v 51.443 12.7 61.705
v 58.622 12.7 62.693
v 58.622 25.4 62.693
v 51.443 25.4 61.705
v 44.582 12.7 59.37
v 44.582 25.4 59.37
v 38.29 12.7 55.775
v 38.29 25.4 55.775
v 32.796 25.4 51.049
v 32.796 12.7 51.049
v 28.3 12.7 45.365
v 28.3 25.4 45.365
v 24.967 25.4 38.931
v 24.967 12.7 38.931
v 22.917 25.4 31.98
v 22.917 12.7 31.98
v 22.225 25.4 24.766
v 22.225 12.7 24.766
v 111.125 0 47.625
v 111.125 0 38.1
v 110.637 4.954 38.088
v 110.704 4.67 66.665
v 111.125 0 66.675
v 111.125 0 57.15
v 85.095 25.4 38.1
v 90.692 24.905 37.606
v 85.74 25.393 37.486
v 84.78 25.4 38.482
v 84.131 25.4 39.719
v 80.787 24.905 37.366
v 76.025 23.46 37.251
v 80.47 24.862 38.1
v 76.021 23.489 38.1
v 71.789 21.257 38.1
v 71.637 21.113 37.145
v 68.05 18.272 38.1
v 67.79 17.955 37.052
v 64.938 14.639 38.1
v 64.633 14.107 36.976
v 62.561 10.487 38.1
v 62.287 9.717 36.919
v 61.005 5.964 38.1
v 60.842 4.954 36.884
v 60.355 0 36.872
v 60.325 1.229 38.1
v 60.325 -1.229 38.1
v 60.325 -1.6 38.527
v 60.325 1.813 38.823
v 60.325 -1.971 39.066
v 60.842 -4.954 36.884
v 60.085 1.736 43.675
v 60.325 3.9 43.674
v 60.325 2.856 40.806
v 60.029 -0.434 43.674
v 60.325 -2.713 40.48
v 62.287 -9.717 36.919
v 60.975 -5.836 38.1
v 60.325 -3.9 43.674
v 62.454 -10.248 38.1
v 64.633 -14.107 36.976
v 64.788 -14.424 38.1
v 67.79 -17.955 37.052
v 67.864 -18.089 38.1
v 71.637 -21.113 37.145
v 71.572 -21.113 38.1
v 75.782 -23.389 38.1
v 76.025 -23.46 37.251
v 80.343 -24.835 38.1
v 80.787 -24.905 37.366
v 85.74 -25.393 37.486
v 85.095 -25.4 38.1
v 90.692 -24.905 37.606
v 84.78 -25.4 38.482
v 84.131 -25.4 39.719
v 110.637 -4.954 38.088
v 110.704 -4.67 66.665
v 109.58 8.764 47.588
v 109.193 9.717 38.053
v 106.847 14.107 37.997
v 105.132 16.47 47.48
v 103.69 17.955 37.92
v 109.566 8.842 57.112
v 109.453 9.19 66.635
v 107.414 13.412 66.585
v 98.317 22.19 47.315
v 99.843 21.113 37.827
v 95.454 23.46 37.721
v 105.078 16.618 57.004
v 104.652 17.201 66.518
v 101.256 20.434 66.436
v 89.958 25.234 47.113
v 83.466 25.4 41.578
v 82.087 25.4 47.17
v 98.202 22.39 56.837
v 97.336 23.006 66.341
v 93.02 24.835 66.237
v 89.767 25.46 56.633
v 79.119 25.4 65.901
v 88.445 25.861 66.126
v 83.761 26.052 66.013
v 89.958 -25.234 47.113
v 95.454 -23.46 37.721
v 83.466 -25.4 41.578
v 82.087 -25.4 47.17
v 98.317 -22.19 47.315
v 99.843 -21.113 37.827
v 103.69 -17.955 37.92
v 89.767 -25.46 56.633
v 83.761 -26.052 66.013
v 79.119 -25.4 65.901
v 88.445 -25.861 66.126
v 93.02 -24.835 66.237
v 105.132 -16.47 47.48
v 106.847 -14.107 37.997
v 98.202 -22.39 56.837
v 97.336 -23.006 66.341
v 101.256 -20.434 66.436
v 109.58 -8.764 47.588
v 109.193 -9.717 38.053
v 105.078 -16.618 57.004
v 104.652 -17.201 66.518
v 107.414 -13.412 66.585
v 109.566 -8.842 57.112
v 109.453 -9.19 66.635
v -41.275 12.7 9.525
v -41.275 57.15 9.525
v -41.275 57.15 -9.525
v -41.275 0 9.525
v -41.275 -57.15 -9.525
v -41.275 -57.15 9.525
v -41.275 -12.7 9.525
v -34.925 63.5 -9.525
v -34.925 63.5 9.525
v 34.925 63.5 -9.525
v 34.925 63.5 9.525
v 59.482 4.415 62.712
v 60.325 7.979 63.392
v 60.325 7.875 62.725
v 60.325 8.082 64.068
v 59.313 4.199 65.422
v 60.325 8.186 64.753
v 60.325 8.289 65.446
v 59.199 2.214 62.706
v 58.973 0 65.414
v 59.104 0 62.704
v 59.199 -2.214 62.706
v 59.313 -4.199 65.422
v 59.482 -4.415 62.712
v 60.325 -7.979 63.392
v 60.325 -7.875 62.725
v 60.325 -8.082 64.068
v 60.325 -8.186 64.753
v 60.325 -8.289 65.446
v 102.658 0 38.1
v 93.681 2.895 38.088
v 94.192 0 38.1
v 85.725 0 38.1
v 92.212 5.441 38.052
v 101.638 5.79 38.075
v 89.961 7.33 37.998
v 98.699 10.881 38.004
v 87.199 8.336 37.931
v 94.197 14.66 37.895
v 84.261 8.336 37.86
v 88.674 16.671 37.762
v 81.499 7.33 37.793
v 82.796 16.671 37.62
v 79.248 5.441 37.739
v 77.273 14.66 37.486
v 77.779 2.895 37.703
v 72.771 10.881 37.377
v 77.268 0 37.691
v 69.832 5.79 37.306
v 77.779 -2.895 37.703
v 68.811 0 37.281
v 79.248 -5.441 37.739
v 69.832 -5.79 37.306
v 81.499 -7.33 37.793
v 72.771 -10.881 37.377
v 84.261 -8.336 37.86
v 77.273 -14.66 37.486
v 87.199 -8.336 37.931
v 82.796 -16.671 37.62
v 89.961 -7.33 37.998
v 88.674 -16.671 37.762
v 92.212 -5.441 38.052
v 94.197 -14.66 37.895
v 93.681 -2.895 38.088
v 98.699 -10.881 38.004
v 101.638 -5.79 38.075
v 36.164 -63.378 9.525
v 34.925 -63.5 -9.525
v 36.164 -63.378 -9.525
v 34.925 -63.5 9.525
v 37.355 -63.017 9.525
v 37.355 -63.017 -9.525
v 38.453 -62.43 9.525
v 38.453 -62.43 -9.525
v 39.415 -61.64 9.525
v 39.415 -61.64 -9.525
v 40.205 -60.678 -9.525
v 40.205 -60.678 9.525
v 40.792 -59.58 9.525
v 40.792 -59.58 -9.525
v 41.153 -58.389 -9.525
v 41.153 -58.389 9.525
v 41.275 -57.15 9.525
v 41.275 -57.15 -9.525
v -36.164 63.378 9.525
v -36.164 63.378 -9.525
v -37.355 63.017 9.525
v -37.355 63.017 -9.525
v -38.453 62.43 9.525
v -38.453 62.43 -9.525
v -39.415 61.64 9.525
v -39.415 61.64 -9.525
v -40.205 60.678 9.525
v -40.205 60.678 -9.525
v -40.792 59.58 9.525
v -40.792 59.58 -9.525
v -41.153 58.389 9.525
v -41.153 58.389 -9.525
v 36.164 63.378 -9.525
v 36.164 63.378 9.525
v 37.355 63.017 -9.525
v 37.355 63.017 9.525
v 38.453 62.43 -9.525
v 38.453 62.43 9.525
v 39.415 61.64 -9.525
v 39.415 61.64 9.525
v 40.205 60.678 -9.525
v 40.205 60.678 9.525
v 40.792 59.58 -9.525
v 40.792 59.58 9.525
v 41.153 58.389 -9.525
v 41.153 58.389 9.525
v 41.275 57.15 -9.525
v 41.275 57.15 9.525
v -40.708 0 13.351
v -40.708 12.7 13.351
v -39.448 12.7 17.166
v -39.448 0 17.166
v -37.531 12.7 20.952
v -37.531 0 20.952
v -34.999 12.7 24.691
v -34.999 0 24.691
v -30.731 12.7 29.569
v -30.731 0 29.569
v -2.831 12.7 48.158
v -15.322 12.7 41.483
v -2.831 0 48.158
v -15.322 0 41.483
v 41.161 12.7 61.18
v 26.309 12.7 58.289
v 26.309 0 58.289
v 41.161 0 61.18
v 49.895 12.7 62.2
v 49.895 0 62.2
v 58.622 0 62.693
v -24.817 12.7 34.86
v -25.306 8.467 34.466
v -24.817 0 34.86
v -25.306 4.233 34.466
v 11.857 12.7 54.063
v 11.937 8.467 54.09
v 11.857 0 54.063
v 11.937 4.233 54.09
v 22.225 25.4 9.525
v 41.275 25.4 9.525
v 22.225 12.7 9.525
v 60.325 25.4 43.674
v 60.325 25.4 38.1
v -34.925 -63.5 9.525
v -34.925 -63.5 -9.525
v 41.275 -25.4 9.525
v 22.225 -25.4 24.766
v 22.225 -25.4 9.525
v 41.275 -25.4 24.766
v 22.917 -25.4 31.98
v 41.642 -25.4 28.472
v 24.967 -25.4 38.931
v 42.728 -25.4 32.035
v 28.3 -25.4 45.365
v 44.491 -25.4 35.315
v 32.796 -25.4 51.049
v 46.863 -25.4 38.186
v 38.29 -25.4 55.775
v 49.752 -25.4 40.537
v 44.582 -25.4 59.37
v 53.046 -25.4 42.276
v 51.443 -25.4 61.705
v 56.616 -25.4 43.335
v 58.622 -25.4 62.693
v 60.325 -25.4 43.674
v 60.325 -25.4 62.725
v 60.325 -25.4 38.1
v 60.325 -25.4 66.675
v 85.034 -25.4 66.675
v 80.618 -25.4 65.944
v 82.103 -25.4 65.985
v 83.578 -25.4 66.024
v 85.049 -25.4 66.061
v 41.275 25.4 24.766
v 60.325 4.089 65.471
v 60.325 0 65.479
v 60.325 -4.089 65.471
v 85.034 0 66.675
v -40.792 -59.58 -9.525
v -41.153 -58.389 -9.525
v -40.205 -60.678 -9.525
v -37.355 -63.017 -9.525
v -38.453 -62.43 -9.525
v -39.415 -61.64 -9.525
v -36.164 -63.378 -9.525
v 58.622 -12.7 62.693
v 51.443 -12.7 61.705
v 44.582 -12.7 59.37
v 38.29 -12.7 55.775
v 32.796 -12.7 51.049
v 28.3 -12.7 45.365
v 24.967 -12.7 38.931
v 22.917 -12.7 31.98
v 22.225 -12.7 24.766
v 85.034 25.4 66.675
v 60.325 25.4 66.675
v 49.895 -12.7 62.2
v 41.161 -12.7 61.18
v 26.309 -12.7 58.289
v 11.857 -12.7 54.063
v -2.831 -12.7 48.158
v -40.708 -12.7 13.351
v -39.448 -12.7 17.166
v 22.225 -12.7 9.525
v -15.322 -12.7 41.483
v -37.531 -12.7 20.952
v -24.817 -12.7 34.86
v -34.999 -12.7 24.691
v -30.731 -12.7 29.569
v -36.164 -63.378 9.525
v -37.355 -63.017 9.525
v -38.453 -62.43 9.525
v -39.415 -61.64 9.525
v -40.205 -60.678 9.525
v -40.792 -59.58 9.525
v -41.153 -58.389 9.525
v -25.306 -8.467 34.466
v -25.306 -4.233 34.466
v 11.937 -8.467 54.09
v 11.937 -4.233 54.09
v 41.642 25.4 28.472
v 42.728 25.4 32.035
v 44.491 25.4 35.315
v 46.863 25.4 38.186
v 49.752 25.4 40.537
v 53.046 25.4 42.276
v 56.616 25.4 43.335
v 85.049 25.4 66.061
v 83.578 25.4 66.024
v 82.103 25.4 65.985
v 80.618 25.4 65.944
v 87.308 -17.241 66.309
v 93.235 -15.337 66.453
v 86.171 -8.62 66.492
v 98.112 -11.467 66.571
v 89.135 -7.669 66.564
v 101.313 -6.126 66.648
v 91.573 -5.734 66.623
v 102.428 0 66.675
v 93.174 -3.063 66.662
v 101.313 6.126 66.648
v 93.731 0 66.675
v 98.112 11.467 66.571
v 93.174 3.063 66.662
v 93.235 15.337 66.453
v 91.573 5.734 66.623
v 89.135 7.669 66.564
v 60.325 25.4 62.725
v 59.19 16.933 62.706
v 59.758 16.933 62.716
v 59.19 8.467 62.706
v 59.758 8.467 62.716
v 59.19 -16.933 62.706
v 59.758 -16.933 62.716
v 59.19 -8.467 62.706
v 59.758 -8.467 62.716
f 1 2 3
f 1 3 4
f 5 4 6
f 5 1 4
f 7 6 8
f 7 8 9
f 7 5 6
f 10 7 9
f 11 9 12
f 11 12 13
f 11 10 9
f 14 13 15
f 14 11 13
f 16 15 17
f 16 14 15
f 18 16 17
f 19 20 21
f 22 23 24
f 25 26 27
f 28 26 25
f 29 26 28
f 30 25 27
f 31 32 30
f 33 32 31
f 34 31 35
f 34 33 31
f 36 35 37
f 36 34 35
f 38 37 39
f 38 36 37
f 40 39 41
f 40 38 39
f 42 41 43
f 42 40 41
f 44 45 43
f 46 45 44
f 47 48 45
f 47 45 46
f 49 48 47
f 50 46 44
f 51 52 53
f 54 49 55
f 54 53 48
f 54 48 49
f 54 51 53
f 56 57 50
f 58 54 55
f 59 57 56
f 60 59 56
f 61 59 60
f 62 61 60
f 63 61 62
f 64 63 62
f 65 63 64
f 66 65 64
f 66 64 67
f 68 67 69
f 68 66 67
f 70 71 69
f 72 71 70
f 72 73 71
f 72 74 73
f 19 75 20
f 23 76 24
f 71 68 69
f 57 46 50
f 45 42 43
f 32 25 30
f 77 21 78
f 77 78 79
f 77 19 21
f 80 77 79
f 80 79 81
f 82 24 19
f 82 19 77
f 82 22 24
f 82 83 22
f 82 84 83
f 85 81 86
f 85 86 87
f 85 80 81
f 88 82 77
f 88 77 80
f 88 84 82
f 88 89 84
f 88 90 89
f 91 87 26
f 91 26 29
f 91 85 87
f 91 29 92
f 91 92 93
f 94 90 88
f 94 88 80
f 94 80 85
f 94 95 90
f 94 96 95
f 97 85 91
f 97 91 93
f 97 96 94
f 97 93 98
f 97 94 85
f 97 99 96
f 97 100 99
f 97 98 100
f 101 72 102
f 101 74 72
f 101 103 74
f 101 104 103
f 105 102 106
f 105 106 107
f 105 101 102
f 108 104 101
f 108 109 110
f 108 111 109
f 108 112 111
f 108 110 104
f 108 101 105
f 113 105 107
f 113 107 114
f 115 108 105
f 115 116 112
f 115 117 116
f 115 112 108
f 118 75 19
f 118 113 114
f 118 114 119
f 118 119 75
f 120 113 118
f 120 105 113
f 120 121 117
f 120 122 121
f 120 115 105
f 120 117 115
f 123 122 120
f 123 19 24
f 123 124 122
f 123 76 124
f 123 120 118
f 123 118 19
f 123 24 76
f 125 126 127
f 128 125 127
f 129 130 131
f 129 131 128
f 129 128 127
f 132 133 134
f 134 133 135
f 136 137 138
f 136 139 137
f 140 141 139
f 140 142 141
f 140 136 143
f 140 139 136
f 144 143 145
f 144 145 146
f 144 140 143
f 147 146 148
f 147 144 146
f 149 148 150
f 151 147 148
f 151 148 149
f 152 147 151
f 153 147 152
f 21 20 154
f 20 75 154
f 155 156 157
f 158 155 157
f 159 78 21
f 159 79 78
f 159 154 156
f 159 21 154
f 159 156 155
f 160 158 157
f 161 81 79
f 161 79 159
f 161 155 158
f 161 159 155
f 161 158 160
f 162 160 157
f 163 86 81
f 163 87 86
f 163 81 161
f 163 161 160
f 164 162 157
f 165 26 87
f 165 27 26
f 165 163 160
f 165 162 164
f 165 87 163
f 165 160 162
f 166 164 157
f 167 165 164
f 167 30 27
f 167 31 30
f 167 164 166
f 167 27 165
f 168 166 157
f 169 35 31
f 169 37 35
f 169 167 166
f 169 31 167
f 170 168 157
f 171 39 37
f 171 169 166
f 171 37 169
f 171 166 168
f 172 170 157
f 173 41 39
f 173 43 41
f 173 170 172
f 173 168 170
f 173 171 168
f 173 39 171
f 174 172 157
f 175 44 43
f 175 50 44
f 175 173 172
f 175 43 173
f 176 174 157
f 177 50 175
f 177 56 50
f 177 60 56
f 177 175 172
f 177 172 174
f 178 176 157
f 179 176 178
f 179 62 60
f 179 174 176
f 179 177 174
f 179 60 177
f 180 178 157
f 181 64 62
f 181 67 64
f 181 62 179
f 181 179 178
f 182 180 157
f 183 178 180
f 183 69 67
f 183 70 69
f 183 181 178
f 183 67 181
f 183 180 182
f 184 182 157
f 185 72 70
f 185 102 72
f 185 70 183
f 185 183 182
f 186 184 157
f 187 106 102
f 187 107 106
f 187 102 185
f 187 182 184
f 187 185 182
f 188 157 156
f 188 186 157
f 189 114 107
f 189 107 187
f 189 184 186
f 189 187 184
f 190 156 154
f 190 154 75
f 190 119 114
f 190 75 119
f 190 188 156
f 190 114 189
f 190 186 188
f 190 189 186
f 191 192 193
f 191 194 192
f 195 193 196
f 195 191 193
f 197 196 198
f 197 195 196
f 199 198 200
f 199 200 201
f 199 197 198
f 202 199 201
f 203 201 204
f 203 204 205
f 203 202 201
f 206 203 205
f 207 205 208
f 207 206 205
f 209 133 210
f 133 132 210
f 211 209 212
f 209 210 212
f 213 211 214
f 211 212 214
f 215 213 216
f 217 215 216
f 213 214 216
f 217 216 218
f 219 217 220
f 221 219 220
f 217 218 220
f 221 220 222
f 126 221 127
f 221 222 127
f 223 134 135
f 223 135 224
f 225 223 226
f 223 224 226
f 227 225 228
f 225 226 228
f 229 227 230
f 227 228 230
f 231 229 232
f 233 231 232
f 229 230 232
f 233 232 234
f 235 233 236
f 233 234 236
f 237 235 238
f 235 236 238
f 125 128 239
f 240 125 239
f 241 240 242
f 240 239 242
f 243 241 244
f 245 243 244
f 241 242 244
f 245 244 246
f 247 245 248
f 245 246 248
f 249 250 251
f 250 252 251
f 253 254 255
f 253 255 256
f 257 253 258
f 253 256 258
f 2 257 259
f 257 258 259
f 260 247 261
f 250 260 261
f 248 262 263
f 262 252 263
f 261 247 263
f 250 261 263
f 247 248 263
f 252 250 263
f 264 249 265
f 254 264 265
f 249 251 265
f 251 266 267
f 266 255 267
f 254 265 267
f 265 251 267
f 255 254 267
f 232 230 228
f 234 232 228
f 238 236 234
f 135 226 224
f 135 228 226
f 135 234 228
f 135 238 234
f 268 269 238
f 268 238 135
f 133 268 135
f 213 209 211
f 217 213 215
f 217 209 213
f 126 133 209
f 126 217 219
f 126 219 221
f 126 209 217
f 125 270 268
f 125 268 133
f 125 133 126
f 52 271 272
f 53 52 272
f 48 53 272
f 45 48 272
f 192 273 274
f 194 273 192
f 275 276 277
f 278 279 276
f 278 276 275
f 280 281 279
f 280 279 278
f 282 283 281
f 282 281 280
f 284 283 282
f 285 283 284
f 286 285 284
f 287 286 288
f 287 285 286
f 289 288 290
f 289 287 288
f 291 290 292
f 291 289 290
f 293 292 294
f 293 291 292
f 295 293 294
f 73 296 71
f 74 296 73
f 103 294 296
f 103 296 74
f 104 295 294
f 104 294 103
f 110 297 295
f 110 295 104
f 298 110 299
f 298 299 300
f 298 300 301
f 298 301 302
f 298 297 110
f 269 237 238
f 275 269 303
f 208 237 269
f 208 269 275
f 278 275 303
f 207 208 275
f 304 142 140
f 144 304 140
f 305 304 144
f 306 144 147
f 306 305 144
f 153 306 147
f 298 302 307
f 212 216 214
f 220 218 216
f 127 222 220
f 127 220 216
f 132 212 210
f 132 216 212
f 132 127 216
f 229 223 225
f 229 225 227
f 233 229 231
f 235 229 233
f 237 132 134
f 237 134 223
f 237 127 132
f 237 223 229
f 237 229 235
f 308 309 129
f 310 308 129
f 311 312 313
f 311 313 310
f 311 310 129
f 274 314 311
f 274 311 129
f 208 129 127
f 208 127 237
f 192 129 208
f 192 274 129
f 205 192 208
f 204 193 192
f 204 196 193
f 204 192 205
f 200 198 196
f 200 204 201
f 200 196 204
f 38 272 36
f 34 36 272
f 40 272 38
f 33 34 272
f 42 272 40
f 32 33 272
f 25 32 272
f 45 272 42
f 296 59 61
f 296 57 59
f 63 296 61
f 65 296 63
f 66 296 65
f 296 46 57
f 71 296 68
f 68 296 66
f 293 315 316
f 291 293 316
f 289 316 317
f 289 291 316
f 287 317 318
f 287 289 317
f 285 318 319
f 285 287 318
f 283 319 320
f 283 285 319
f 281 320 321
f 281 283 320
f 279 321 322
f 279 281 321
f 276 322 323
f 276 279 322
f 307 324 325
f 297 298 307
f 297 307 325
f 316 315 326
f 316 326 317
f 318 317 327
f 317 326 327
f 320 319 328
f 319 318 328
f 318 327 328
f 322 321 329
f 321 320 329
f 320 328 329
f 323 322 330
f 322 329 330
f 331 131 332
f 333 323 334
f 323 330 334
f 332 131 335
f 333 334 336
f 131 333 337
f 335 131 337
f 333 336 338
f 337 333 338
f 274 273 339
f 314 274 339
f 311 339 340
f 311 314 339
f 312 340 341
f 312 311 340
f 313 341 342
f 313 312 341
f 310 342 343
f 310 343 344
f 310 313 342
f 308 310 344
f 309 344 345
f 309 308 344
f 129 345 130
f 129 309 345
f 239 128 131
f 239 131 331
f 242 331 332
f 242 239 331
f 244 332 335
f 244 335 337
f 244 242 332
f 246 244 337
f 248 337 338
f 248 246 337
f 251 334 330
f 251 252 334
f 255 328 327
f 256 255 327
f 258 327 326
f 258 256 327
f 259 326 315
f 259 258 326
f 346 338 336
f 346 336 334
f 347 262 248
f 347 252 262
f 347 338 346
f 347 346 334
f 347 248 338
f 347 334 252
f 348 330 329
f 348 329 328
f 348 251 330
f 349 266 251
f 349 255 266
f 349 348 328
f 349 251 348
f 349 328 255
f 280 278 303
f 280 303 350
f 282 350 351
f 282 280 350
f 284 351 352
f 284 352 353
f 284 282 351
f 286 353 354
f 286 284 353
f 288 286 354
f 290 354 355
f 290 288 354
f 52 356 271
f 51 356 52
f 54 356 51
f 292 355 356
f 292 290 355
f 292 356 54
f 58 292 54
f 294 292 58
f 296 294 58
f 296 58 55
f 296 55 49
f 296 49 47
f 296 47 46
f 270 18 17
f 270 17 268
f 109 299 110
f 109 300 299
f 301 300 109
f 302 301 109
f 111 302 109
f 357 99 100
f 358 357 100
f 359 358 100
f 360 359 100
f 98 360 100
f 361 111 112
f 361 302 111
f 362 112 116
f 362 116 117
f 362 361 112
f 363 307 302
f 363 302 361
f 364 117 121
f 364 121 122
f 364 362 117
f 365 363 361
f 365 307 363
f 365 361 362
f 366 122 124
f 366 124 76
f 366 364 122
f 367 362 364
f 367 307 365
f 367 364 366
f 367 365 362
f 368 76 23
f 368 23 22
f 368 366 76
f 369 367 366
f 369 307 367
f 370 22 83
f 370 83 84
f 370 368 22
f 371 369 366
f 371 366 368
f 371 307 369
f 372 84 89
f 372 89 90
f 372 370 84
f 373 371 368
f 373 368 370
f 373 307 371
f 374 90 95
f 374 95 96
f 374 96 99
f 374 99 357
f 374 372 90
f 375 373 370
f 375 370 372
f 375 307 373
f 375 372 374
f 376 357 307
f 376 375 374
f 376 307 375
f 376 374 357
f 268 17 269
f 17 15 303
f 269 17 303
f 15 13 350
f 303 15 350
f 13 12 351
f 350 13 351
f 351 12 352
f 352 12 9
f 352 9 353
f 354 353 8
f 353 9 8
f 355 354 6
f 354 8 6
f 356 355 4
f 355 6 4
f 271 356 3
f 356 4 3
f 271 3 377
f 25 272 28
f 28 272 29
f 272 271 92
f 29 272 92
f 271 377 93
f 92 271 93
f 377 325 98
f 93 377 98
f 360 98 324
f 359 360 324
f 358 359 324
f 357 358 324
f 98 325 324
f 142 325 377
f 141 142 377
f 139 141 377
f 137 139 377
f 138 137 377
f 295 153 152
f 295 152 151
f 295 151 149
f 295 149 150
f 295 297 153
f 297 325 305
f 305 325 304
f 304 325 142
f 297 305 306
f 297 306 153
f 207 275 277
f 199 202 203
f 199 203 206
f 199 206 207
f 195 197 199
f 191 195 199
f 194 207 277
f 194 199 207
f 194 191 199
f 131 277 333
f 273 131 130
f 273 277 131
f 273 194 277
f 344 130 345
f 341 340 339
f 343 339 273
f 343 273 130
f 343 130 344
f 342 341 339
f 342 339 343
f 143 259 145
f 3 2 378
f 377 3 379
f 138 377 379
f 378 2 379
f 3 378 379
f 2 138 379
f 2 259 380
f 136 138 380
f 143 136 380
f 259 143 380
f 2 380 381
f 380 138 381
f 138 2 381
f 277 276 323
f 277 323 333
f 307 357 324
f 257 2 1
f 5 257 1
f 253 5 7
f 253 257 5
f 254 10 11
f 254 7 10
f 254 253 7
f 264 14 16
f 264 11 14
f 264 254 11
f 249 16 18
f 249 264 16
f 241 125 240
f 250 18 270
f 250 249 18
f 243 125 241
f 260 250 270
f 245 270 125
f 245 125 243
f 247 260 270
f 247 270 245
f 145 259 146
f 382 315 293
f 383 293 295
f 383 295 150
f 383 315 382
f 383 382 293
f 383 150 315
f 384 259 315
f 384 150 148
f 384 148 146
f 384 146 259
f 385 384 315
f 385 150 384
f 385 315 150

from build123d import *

# Parameters (mm, degrees)
F1_DEPTH = 63.5
F2_DEPTH = 25.4
F3_DEPTH = 12.7
F5_R     = 6.35


with BuildPart() as f1:
    # F0 (on Front) → F1 (new body, symmetric)
    with BuildSketch(Plane.XZ):
        Polygon((22.225, 9.525), (-41.275, 9.525), (-41.275, -9.525), (41.275, -9.525), (41.275, 9.525), align=None)
    extrude(amount=F1_DEPTH, both=True)

    # F0 (on Front) → F2 (join, symmetric)
    with BuildSketch(Plane.XZ):
        with BuildLine():
            Line((22.225, 24.7660442862), (22.225, 9.525))
            Line((22.225, 9.525), (41.275, 9.525))
            Line((41.275, 9.525), (41.275, 24.7660442862))
            ThreePointArc((41.275, 24.7660442862), (46.8632744023, 38.1864149015), (60.325, 43.6743199825))
            Line((60.325, 43.6743199825), (60.325, 62.7245845587))
            add(Edge.make_bspline(
                [(58.6218546558, 62.6926976316), (59.1901148173, 62.7069385572), (59.7578604016, 62.7175822247), (60.325, 62.7245845587)],
                knots=[113.3285433614, 113.3285433614, 113.3285433614, 113.3285433614, 114.6854646292, 114.6854646292, 114.6854646292, 114.6854646292], degree=3))
            ThreePointArc((58.6218546558, 62.6926976316), (32.7962107912, 51.0489382613), (22.225, 24.7660442862))
        make_face()
        Polygon((60.325, 66.675), (60.325, 62.7245845587), (60.325, 43.6743199825), (85.5901753482, 43.6743199825), (85.0338637829, 66.675), align=None)
        Polygon((85.5901753482, 43.6743199825), (60.325, 43.6743199825), (60.325, 38.1), (85.725, 38.1), align=None)
    extrude(amount=F2_DEPTH, both=True)

    # F0 (on Front) → F3 (join, symmetric)
    with BuildSketch(Plane.XZ):
        with BuildLine():
            add(Edge.make_bspline(
                [(-41.275, 9.525), (-39.8884323403, 35.2216003411), (11.1614029089, 61.5033114907), (58.6218546558, 62.6926976316)],
                knots=[0, 0, 0, 0, 113.3285433614, 113.3285433614, 113.3285433614, 113.3285433614], degree=3))
            Line((-41.275, 9.525), (22.225, 9.525))
            Line((22.225, 9.525), (22.225, 24.7660442862))
            ThreePointArc((22.225, 24.7660442862), (32.7962107912, 51.0489382613), (58.6218546558, 62.6926976316))
        make_face()
    extrude(amount=F3_DEPTH, both=True)

    # F0 (on Front) → F4 (revolve)
    with BuildSketch(Plane.XZ):
        Polygon((85.0338637829, 66.675), (85.5901753482, 43.6743199825), (85.725, 38.1), (111.125, 38.1), (111.125, 66.675), align=None)
    revolve(axis=Axis((85.3794318914, 0, 52.3875), (-0.0241796728, 0, 0.999707629)))

    # F5
    f5_edges = [f1.edges().sort_by_distance(p)[0] for p in [
        (-41.275, -63.5, 0),
        (41.275, -63.5, 0),
        (-41.275, 63.5, 0),
        (41.275, 63.5, 0),
    ]]
    fillet(f5_edges, radius=F5_R)


solid = f1.part
